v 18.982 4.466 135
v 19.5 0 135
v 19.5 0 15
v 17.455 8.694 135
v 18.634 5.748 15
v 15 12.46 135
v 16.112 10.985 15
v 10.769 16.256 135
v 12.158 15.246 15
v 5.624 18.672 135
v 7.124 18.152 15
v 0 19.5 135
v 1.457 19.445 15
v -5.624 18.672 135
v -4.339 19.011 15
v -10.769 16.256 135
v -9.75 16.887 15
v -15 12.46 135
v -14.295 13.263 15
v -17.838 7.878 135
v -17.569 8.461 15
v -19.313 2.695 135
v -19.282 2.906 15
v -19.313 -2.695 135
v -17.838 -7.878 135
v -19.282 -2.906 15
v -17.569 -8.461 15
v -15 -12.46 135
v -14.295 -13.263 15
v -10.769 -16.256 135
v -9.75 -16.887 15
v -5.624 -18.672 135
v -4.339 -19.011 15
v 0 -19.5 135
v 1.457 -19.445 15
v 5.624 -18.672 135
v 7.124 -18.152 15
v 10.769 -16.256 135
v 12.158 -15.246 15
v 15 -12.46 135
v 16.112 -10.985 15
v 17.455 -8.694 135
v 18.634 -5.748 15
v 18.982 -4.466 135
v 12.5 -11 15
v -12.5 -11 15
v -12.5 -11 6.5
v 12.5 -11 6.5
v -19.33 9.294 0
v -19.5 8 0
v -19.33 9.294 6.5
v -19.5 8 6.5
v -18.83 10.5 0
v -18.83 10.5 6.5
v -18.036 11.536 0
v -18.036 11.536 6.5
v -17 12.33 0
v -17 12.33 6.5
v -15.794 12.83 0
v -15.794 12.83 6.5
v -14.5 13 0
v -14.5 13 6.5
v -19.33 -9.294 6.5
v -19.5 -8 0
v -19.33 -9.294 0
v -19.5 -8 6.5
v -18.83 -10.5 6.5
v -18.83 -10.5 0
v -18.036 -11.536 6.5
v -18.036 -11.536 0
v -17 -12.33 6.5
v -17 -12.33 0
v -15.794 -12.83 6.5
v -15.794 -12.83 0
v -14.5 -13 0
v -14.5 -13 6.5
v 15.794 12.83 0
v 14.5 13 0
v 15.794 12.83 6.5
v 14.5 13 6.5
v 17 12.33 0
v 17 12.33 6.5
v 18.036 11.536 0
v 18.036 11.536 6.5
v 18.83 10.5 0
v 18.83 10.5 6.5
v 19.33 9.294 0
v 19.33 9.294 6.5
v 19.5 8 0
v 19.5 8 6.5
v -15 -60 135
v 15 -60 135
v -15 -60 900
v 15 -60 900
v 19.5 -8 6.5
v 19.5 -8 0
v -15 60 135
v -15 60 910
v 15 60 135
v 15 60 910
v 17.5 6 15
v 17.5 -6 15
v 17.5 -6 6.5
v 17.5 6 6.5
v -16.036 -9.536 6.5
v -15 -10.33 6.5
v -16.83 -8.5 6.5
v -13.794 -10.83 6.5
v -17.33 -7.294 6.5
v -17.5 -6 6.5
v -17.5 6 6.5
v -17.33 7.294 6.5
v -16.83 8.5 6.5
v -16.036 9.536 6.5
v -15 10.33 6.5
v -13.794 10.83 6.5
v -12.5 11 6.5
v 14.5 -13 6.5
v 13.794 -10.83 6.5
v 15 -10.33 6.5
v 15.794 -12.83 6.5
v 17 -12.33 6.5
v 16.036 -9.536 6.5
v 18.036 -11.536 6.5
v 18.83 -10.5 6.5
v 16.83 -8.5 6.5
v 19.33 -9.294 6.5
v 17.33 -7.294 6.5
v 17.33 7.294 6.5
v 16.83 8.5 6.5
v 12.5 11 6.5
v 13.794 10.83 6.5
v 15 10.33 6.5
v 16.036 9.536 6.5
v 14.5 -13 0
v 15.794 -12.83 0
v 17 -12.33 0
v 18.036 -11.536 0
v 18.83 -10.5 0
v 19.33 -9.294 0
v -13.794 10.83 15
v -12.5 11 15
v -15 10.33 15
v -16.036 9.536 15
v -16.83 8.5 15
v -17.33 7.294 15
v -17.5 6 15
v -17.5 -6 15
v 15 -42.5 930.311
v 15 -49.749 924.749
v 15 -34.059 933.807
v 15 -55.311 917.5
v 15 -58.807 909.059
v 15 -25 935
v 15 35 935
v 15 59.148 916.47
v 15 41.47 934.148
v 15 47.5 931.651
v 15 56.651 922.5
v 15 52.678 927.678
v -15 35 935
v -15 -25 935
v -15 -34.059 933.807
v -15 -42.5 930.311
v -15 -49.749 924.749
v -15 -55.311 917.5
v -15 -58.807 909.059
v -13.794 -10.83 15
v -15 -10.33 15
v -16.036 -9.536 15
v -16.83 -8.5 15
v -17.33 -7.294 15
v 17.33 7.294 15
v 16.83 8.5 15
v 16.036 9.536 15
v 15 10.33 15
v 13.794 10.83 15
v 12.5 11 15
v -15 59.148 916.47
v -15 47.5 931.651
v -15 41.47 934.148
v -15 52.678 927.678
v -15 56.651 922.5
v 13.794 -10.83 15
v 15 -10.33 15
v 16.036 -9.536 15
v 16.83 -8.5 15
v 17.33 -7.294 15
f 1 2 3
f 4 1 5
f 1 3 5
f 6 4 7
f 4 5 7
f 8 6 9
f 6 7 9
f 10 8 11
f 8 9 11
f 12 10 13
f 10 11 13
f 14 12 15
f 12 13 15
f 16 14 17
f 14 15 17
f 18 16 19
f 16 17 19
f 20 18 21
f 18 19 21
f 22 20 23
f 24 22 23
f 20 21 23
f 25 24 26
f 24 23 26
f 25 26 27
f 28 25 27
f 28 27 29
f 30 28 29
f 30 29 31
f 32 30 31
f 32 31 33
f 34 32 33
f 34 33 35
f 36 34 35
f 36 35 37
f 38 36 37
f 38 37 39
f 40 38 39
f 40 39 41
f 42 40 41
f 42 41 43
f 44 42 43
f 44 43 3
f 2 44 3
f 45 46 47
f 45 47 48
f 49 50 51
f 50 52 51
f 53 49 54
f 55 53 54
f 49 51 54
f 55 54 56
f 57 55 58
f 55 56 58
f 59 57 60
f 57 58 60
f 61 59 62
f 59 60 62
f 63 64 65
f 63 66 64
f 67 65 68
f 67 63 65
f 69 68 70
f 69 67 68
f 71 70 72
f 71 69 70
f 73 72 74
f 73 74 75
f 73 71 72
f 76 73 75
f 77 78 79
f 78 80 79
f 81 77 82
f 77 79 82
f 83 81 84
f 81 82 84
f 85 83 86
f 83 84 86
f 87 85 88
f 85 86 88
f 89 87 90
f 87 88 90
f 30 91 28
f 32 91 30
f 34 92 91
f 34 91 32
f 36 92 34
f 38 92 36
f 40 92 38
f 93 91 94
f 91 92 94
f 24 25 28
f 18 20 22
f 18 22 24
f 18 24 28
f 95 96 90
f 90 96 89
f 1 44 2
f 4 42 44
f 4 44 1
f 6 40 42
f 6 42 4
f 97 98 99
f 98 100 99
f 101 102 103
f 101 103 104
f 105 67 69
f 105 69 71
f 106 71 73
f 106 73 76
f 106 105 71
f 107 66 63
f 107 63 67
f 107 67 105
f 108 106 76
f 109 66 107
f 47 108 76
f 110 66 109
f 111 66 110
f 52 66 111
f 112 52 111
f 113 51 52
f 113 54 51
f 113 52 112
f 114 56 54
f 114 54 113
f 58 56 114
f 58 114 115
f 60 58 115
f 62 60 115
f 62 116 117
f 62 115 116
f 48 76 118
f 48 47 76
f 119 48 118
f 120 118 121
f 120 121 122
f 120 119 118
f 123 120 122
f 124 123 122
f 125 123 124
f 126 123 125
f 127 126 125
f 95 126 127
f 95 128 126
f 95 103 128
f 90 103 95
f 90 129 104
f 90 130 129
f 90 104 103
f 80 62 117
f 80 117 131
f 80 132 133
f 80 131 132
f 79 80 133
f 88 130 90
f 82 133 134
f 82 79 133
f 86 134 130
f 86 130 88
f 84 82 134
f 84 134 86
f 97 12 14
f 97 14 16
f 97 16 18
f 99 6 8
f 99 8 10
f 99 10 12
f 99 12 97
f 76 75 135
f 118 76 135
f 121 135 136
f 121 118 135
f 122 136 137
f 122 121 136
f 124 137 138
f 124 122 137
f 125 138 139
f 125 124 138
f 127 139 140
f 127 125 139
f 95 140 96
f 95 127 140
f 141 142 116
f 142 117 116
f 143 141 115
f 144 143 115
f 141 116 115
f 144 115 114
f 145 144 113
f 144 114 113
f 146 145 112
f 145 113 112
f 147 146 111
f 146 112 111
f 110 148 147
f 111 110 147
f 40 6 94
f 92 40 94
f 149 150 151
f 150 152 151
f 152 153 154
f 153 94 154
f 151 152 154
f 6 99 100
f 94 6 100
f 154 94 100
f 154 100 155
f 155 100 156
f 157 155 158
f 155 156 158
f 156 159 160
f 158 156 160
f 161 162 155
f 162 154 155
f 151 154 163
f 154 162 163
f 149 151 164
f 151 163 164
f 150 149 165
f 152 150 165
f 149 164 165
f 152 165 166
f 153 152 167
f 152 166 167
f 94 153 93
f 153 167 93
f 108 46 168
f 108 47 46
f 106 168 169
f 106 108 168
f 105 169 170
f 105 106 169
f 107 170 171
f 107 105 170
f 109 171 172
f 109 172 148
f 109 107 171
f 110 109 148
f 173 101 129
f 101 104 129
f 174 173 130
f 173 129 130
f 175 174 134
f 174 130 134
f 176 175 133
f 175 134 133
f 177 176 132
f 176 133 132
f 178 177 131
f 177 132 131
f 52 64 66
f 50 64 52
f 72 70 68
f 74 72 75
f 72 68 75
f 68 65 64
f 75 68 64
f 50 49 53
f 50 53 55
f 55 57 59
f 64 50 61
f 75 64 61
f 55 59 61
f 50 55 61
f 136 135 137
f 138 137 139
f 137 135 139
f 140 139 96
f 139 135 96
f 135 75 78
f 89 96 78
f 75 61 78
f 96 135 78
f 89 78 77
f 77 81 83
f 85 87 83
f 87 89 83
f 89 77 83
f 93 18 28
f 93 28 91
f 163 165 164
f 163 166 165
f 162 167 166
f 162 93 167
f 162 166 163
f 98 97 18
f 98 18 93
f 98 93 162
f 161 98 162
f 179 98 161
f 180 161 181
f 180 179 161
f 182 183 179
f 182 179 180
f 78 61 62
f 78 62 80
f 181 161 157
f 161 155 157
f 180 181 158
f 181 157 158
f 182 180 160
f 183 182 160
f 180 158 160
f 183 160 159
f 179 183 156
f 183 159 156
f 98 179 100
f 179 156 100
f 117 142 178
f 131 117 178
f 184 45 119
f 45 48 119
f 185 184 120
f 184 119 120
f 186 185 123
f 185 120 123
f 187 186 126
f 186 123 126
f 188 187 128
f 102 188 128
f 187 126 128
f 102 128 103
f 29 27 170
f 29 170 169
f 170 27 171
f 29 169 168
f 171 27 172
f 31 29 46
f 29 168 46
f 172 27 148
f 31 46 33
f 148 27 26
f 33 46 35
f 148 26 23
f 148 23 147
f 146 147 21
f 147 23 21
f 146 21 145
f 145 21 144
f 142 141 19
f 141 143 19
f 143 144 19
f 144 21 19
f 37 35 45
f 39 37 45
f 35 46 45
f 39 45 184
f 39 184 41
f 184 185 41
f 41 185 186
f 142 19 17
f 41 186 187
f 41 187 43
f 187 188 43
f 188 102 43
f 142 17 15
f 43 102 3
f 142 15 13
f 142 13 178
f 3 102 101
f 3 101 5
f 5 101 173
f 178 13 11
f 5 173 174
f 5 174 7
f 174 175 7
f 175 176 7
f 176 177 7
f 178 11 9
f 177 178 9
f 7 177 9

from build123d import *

# Parameters (mm, degrees)
SKETCH1_W           = 39
SKETCH1_H           = 26
BOSS_EXTRUDE1_DEPTH = 15
SKETCH2_W           = 39
SKETCH2_H           = 26
SKETCH2_W_2         = 35
SKETCH2_H_2         = 22
CUT_EXTRUDE1_DEPTH  = 8.5
FILLET1_R           = 5
SKETCH3_R           = 19.5
BOSS_EXTRUDE2_DEPTH = 120
BOSS_EXTRUDE3_DEPTH = 15
FILLET2_R           = 25
FILLET3_R           = 35


with BuildPart() as part:
    # Sketch1 → Boss-Extrude1 (new body)
    with BuildSketch(Plane.XY):
        Rectangle(SKETCH1_W, SKETCH1_H)
    extrude(amount=BOSS_EXTRUDE1_DEPTH)

    # Sketch2 → Cut-Extrude1 (cut)
    with BuildSketch(Plane.XY.offset(15)):
        Rectangle(SKETCH2_W, SKETCH2_H)
        Rectangle(SKETCH2_W_2, SKETCH2_H_2, mode=Mode.SUBTRACT)
    extrude(amount=-CUT_EXTRUDE1_DEPTH, mode=Mode.SUBTRACT)

    # Fillet1
    fillet1_edges = [part.edges().sort_by_distance(p)[0] for p in [
        (19.5, -13, 3.25),
        (-19.5, -13, 3.25),
        (-19.5, 13, 3.25),
        (19.5, 13, 3.25),
        (17.5, -11, 10.75),
        (17.5, 11, 10.75),
        (-17.5, 11, 10.75),
        (-17.5, -11, 10.75),
    ]]
    fillet(fillet1_edges, radius=FILLET1_R)

    # Sketch3 → Boss-Extrude2 (add)
    with BuildSketch(Plane.XY.offset(15)):
        Circle(SKETCH3_R)
    extrude(amount=BOSS_EXTRUDE2_DEPTH)

    # Sketch4 → Boss-Extrude3 (add, symmetric)
    with BuildSketch(Plane(origin=(0, 0, 0), x_dir=(0, 0, -1), z_dir=(1, 0, 0))):
        Polygon((-135, 19.5), (-135, -19.5), (-135, -60), (-935, -60), (-935, 60), (-135, 60), align=None)
    extrude(amount=BOSS_EXTRUDE3_DEPTH, both=True)

    # Fillet2
    fillet2_edges = [part.edges().sort_by_distance(p)[0] for p in [
        (0, 60, 935),
    ]]
    fillet(fillet2_edges, radius=FILLET2_R)

    # Fillet3
    fillet3_edges = [part.edges().sort_by_distance(p)[0] for p in [
        (0, -60, 935),
    ]]
    fillet(fillet3_edges, radius=FILLET3_R)


solid = part.part
